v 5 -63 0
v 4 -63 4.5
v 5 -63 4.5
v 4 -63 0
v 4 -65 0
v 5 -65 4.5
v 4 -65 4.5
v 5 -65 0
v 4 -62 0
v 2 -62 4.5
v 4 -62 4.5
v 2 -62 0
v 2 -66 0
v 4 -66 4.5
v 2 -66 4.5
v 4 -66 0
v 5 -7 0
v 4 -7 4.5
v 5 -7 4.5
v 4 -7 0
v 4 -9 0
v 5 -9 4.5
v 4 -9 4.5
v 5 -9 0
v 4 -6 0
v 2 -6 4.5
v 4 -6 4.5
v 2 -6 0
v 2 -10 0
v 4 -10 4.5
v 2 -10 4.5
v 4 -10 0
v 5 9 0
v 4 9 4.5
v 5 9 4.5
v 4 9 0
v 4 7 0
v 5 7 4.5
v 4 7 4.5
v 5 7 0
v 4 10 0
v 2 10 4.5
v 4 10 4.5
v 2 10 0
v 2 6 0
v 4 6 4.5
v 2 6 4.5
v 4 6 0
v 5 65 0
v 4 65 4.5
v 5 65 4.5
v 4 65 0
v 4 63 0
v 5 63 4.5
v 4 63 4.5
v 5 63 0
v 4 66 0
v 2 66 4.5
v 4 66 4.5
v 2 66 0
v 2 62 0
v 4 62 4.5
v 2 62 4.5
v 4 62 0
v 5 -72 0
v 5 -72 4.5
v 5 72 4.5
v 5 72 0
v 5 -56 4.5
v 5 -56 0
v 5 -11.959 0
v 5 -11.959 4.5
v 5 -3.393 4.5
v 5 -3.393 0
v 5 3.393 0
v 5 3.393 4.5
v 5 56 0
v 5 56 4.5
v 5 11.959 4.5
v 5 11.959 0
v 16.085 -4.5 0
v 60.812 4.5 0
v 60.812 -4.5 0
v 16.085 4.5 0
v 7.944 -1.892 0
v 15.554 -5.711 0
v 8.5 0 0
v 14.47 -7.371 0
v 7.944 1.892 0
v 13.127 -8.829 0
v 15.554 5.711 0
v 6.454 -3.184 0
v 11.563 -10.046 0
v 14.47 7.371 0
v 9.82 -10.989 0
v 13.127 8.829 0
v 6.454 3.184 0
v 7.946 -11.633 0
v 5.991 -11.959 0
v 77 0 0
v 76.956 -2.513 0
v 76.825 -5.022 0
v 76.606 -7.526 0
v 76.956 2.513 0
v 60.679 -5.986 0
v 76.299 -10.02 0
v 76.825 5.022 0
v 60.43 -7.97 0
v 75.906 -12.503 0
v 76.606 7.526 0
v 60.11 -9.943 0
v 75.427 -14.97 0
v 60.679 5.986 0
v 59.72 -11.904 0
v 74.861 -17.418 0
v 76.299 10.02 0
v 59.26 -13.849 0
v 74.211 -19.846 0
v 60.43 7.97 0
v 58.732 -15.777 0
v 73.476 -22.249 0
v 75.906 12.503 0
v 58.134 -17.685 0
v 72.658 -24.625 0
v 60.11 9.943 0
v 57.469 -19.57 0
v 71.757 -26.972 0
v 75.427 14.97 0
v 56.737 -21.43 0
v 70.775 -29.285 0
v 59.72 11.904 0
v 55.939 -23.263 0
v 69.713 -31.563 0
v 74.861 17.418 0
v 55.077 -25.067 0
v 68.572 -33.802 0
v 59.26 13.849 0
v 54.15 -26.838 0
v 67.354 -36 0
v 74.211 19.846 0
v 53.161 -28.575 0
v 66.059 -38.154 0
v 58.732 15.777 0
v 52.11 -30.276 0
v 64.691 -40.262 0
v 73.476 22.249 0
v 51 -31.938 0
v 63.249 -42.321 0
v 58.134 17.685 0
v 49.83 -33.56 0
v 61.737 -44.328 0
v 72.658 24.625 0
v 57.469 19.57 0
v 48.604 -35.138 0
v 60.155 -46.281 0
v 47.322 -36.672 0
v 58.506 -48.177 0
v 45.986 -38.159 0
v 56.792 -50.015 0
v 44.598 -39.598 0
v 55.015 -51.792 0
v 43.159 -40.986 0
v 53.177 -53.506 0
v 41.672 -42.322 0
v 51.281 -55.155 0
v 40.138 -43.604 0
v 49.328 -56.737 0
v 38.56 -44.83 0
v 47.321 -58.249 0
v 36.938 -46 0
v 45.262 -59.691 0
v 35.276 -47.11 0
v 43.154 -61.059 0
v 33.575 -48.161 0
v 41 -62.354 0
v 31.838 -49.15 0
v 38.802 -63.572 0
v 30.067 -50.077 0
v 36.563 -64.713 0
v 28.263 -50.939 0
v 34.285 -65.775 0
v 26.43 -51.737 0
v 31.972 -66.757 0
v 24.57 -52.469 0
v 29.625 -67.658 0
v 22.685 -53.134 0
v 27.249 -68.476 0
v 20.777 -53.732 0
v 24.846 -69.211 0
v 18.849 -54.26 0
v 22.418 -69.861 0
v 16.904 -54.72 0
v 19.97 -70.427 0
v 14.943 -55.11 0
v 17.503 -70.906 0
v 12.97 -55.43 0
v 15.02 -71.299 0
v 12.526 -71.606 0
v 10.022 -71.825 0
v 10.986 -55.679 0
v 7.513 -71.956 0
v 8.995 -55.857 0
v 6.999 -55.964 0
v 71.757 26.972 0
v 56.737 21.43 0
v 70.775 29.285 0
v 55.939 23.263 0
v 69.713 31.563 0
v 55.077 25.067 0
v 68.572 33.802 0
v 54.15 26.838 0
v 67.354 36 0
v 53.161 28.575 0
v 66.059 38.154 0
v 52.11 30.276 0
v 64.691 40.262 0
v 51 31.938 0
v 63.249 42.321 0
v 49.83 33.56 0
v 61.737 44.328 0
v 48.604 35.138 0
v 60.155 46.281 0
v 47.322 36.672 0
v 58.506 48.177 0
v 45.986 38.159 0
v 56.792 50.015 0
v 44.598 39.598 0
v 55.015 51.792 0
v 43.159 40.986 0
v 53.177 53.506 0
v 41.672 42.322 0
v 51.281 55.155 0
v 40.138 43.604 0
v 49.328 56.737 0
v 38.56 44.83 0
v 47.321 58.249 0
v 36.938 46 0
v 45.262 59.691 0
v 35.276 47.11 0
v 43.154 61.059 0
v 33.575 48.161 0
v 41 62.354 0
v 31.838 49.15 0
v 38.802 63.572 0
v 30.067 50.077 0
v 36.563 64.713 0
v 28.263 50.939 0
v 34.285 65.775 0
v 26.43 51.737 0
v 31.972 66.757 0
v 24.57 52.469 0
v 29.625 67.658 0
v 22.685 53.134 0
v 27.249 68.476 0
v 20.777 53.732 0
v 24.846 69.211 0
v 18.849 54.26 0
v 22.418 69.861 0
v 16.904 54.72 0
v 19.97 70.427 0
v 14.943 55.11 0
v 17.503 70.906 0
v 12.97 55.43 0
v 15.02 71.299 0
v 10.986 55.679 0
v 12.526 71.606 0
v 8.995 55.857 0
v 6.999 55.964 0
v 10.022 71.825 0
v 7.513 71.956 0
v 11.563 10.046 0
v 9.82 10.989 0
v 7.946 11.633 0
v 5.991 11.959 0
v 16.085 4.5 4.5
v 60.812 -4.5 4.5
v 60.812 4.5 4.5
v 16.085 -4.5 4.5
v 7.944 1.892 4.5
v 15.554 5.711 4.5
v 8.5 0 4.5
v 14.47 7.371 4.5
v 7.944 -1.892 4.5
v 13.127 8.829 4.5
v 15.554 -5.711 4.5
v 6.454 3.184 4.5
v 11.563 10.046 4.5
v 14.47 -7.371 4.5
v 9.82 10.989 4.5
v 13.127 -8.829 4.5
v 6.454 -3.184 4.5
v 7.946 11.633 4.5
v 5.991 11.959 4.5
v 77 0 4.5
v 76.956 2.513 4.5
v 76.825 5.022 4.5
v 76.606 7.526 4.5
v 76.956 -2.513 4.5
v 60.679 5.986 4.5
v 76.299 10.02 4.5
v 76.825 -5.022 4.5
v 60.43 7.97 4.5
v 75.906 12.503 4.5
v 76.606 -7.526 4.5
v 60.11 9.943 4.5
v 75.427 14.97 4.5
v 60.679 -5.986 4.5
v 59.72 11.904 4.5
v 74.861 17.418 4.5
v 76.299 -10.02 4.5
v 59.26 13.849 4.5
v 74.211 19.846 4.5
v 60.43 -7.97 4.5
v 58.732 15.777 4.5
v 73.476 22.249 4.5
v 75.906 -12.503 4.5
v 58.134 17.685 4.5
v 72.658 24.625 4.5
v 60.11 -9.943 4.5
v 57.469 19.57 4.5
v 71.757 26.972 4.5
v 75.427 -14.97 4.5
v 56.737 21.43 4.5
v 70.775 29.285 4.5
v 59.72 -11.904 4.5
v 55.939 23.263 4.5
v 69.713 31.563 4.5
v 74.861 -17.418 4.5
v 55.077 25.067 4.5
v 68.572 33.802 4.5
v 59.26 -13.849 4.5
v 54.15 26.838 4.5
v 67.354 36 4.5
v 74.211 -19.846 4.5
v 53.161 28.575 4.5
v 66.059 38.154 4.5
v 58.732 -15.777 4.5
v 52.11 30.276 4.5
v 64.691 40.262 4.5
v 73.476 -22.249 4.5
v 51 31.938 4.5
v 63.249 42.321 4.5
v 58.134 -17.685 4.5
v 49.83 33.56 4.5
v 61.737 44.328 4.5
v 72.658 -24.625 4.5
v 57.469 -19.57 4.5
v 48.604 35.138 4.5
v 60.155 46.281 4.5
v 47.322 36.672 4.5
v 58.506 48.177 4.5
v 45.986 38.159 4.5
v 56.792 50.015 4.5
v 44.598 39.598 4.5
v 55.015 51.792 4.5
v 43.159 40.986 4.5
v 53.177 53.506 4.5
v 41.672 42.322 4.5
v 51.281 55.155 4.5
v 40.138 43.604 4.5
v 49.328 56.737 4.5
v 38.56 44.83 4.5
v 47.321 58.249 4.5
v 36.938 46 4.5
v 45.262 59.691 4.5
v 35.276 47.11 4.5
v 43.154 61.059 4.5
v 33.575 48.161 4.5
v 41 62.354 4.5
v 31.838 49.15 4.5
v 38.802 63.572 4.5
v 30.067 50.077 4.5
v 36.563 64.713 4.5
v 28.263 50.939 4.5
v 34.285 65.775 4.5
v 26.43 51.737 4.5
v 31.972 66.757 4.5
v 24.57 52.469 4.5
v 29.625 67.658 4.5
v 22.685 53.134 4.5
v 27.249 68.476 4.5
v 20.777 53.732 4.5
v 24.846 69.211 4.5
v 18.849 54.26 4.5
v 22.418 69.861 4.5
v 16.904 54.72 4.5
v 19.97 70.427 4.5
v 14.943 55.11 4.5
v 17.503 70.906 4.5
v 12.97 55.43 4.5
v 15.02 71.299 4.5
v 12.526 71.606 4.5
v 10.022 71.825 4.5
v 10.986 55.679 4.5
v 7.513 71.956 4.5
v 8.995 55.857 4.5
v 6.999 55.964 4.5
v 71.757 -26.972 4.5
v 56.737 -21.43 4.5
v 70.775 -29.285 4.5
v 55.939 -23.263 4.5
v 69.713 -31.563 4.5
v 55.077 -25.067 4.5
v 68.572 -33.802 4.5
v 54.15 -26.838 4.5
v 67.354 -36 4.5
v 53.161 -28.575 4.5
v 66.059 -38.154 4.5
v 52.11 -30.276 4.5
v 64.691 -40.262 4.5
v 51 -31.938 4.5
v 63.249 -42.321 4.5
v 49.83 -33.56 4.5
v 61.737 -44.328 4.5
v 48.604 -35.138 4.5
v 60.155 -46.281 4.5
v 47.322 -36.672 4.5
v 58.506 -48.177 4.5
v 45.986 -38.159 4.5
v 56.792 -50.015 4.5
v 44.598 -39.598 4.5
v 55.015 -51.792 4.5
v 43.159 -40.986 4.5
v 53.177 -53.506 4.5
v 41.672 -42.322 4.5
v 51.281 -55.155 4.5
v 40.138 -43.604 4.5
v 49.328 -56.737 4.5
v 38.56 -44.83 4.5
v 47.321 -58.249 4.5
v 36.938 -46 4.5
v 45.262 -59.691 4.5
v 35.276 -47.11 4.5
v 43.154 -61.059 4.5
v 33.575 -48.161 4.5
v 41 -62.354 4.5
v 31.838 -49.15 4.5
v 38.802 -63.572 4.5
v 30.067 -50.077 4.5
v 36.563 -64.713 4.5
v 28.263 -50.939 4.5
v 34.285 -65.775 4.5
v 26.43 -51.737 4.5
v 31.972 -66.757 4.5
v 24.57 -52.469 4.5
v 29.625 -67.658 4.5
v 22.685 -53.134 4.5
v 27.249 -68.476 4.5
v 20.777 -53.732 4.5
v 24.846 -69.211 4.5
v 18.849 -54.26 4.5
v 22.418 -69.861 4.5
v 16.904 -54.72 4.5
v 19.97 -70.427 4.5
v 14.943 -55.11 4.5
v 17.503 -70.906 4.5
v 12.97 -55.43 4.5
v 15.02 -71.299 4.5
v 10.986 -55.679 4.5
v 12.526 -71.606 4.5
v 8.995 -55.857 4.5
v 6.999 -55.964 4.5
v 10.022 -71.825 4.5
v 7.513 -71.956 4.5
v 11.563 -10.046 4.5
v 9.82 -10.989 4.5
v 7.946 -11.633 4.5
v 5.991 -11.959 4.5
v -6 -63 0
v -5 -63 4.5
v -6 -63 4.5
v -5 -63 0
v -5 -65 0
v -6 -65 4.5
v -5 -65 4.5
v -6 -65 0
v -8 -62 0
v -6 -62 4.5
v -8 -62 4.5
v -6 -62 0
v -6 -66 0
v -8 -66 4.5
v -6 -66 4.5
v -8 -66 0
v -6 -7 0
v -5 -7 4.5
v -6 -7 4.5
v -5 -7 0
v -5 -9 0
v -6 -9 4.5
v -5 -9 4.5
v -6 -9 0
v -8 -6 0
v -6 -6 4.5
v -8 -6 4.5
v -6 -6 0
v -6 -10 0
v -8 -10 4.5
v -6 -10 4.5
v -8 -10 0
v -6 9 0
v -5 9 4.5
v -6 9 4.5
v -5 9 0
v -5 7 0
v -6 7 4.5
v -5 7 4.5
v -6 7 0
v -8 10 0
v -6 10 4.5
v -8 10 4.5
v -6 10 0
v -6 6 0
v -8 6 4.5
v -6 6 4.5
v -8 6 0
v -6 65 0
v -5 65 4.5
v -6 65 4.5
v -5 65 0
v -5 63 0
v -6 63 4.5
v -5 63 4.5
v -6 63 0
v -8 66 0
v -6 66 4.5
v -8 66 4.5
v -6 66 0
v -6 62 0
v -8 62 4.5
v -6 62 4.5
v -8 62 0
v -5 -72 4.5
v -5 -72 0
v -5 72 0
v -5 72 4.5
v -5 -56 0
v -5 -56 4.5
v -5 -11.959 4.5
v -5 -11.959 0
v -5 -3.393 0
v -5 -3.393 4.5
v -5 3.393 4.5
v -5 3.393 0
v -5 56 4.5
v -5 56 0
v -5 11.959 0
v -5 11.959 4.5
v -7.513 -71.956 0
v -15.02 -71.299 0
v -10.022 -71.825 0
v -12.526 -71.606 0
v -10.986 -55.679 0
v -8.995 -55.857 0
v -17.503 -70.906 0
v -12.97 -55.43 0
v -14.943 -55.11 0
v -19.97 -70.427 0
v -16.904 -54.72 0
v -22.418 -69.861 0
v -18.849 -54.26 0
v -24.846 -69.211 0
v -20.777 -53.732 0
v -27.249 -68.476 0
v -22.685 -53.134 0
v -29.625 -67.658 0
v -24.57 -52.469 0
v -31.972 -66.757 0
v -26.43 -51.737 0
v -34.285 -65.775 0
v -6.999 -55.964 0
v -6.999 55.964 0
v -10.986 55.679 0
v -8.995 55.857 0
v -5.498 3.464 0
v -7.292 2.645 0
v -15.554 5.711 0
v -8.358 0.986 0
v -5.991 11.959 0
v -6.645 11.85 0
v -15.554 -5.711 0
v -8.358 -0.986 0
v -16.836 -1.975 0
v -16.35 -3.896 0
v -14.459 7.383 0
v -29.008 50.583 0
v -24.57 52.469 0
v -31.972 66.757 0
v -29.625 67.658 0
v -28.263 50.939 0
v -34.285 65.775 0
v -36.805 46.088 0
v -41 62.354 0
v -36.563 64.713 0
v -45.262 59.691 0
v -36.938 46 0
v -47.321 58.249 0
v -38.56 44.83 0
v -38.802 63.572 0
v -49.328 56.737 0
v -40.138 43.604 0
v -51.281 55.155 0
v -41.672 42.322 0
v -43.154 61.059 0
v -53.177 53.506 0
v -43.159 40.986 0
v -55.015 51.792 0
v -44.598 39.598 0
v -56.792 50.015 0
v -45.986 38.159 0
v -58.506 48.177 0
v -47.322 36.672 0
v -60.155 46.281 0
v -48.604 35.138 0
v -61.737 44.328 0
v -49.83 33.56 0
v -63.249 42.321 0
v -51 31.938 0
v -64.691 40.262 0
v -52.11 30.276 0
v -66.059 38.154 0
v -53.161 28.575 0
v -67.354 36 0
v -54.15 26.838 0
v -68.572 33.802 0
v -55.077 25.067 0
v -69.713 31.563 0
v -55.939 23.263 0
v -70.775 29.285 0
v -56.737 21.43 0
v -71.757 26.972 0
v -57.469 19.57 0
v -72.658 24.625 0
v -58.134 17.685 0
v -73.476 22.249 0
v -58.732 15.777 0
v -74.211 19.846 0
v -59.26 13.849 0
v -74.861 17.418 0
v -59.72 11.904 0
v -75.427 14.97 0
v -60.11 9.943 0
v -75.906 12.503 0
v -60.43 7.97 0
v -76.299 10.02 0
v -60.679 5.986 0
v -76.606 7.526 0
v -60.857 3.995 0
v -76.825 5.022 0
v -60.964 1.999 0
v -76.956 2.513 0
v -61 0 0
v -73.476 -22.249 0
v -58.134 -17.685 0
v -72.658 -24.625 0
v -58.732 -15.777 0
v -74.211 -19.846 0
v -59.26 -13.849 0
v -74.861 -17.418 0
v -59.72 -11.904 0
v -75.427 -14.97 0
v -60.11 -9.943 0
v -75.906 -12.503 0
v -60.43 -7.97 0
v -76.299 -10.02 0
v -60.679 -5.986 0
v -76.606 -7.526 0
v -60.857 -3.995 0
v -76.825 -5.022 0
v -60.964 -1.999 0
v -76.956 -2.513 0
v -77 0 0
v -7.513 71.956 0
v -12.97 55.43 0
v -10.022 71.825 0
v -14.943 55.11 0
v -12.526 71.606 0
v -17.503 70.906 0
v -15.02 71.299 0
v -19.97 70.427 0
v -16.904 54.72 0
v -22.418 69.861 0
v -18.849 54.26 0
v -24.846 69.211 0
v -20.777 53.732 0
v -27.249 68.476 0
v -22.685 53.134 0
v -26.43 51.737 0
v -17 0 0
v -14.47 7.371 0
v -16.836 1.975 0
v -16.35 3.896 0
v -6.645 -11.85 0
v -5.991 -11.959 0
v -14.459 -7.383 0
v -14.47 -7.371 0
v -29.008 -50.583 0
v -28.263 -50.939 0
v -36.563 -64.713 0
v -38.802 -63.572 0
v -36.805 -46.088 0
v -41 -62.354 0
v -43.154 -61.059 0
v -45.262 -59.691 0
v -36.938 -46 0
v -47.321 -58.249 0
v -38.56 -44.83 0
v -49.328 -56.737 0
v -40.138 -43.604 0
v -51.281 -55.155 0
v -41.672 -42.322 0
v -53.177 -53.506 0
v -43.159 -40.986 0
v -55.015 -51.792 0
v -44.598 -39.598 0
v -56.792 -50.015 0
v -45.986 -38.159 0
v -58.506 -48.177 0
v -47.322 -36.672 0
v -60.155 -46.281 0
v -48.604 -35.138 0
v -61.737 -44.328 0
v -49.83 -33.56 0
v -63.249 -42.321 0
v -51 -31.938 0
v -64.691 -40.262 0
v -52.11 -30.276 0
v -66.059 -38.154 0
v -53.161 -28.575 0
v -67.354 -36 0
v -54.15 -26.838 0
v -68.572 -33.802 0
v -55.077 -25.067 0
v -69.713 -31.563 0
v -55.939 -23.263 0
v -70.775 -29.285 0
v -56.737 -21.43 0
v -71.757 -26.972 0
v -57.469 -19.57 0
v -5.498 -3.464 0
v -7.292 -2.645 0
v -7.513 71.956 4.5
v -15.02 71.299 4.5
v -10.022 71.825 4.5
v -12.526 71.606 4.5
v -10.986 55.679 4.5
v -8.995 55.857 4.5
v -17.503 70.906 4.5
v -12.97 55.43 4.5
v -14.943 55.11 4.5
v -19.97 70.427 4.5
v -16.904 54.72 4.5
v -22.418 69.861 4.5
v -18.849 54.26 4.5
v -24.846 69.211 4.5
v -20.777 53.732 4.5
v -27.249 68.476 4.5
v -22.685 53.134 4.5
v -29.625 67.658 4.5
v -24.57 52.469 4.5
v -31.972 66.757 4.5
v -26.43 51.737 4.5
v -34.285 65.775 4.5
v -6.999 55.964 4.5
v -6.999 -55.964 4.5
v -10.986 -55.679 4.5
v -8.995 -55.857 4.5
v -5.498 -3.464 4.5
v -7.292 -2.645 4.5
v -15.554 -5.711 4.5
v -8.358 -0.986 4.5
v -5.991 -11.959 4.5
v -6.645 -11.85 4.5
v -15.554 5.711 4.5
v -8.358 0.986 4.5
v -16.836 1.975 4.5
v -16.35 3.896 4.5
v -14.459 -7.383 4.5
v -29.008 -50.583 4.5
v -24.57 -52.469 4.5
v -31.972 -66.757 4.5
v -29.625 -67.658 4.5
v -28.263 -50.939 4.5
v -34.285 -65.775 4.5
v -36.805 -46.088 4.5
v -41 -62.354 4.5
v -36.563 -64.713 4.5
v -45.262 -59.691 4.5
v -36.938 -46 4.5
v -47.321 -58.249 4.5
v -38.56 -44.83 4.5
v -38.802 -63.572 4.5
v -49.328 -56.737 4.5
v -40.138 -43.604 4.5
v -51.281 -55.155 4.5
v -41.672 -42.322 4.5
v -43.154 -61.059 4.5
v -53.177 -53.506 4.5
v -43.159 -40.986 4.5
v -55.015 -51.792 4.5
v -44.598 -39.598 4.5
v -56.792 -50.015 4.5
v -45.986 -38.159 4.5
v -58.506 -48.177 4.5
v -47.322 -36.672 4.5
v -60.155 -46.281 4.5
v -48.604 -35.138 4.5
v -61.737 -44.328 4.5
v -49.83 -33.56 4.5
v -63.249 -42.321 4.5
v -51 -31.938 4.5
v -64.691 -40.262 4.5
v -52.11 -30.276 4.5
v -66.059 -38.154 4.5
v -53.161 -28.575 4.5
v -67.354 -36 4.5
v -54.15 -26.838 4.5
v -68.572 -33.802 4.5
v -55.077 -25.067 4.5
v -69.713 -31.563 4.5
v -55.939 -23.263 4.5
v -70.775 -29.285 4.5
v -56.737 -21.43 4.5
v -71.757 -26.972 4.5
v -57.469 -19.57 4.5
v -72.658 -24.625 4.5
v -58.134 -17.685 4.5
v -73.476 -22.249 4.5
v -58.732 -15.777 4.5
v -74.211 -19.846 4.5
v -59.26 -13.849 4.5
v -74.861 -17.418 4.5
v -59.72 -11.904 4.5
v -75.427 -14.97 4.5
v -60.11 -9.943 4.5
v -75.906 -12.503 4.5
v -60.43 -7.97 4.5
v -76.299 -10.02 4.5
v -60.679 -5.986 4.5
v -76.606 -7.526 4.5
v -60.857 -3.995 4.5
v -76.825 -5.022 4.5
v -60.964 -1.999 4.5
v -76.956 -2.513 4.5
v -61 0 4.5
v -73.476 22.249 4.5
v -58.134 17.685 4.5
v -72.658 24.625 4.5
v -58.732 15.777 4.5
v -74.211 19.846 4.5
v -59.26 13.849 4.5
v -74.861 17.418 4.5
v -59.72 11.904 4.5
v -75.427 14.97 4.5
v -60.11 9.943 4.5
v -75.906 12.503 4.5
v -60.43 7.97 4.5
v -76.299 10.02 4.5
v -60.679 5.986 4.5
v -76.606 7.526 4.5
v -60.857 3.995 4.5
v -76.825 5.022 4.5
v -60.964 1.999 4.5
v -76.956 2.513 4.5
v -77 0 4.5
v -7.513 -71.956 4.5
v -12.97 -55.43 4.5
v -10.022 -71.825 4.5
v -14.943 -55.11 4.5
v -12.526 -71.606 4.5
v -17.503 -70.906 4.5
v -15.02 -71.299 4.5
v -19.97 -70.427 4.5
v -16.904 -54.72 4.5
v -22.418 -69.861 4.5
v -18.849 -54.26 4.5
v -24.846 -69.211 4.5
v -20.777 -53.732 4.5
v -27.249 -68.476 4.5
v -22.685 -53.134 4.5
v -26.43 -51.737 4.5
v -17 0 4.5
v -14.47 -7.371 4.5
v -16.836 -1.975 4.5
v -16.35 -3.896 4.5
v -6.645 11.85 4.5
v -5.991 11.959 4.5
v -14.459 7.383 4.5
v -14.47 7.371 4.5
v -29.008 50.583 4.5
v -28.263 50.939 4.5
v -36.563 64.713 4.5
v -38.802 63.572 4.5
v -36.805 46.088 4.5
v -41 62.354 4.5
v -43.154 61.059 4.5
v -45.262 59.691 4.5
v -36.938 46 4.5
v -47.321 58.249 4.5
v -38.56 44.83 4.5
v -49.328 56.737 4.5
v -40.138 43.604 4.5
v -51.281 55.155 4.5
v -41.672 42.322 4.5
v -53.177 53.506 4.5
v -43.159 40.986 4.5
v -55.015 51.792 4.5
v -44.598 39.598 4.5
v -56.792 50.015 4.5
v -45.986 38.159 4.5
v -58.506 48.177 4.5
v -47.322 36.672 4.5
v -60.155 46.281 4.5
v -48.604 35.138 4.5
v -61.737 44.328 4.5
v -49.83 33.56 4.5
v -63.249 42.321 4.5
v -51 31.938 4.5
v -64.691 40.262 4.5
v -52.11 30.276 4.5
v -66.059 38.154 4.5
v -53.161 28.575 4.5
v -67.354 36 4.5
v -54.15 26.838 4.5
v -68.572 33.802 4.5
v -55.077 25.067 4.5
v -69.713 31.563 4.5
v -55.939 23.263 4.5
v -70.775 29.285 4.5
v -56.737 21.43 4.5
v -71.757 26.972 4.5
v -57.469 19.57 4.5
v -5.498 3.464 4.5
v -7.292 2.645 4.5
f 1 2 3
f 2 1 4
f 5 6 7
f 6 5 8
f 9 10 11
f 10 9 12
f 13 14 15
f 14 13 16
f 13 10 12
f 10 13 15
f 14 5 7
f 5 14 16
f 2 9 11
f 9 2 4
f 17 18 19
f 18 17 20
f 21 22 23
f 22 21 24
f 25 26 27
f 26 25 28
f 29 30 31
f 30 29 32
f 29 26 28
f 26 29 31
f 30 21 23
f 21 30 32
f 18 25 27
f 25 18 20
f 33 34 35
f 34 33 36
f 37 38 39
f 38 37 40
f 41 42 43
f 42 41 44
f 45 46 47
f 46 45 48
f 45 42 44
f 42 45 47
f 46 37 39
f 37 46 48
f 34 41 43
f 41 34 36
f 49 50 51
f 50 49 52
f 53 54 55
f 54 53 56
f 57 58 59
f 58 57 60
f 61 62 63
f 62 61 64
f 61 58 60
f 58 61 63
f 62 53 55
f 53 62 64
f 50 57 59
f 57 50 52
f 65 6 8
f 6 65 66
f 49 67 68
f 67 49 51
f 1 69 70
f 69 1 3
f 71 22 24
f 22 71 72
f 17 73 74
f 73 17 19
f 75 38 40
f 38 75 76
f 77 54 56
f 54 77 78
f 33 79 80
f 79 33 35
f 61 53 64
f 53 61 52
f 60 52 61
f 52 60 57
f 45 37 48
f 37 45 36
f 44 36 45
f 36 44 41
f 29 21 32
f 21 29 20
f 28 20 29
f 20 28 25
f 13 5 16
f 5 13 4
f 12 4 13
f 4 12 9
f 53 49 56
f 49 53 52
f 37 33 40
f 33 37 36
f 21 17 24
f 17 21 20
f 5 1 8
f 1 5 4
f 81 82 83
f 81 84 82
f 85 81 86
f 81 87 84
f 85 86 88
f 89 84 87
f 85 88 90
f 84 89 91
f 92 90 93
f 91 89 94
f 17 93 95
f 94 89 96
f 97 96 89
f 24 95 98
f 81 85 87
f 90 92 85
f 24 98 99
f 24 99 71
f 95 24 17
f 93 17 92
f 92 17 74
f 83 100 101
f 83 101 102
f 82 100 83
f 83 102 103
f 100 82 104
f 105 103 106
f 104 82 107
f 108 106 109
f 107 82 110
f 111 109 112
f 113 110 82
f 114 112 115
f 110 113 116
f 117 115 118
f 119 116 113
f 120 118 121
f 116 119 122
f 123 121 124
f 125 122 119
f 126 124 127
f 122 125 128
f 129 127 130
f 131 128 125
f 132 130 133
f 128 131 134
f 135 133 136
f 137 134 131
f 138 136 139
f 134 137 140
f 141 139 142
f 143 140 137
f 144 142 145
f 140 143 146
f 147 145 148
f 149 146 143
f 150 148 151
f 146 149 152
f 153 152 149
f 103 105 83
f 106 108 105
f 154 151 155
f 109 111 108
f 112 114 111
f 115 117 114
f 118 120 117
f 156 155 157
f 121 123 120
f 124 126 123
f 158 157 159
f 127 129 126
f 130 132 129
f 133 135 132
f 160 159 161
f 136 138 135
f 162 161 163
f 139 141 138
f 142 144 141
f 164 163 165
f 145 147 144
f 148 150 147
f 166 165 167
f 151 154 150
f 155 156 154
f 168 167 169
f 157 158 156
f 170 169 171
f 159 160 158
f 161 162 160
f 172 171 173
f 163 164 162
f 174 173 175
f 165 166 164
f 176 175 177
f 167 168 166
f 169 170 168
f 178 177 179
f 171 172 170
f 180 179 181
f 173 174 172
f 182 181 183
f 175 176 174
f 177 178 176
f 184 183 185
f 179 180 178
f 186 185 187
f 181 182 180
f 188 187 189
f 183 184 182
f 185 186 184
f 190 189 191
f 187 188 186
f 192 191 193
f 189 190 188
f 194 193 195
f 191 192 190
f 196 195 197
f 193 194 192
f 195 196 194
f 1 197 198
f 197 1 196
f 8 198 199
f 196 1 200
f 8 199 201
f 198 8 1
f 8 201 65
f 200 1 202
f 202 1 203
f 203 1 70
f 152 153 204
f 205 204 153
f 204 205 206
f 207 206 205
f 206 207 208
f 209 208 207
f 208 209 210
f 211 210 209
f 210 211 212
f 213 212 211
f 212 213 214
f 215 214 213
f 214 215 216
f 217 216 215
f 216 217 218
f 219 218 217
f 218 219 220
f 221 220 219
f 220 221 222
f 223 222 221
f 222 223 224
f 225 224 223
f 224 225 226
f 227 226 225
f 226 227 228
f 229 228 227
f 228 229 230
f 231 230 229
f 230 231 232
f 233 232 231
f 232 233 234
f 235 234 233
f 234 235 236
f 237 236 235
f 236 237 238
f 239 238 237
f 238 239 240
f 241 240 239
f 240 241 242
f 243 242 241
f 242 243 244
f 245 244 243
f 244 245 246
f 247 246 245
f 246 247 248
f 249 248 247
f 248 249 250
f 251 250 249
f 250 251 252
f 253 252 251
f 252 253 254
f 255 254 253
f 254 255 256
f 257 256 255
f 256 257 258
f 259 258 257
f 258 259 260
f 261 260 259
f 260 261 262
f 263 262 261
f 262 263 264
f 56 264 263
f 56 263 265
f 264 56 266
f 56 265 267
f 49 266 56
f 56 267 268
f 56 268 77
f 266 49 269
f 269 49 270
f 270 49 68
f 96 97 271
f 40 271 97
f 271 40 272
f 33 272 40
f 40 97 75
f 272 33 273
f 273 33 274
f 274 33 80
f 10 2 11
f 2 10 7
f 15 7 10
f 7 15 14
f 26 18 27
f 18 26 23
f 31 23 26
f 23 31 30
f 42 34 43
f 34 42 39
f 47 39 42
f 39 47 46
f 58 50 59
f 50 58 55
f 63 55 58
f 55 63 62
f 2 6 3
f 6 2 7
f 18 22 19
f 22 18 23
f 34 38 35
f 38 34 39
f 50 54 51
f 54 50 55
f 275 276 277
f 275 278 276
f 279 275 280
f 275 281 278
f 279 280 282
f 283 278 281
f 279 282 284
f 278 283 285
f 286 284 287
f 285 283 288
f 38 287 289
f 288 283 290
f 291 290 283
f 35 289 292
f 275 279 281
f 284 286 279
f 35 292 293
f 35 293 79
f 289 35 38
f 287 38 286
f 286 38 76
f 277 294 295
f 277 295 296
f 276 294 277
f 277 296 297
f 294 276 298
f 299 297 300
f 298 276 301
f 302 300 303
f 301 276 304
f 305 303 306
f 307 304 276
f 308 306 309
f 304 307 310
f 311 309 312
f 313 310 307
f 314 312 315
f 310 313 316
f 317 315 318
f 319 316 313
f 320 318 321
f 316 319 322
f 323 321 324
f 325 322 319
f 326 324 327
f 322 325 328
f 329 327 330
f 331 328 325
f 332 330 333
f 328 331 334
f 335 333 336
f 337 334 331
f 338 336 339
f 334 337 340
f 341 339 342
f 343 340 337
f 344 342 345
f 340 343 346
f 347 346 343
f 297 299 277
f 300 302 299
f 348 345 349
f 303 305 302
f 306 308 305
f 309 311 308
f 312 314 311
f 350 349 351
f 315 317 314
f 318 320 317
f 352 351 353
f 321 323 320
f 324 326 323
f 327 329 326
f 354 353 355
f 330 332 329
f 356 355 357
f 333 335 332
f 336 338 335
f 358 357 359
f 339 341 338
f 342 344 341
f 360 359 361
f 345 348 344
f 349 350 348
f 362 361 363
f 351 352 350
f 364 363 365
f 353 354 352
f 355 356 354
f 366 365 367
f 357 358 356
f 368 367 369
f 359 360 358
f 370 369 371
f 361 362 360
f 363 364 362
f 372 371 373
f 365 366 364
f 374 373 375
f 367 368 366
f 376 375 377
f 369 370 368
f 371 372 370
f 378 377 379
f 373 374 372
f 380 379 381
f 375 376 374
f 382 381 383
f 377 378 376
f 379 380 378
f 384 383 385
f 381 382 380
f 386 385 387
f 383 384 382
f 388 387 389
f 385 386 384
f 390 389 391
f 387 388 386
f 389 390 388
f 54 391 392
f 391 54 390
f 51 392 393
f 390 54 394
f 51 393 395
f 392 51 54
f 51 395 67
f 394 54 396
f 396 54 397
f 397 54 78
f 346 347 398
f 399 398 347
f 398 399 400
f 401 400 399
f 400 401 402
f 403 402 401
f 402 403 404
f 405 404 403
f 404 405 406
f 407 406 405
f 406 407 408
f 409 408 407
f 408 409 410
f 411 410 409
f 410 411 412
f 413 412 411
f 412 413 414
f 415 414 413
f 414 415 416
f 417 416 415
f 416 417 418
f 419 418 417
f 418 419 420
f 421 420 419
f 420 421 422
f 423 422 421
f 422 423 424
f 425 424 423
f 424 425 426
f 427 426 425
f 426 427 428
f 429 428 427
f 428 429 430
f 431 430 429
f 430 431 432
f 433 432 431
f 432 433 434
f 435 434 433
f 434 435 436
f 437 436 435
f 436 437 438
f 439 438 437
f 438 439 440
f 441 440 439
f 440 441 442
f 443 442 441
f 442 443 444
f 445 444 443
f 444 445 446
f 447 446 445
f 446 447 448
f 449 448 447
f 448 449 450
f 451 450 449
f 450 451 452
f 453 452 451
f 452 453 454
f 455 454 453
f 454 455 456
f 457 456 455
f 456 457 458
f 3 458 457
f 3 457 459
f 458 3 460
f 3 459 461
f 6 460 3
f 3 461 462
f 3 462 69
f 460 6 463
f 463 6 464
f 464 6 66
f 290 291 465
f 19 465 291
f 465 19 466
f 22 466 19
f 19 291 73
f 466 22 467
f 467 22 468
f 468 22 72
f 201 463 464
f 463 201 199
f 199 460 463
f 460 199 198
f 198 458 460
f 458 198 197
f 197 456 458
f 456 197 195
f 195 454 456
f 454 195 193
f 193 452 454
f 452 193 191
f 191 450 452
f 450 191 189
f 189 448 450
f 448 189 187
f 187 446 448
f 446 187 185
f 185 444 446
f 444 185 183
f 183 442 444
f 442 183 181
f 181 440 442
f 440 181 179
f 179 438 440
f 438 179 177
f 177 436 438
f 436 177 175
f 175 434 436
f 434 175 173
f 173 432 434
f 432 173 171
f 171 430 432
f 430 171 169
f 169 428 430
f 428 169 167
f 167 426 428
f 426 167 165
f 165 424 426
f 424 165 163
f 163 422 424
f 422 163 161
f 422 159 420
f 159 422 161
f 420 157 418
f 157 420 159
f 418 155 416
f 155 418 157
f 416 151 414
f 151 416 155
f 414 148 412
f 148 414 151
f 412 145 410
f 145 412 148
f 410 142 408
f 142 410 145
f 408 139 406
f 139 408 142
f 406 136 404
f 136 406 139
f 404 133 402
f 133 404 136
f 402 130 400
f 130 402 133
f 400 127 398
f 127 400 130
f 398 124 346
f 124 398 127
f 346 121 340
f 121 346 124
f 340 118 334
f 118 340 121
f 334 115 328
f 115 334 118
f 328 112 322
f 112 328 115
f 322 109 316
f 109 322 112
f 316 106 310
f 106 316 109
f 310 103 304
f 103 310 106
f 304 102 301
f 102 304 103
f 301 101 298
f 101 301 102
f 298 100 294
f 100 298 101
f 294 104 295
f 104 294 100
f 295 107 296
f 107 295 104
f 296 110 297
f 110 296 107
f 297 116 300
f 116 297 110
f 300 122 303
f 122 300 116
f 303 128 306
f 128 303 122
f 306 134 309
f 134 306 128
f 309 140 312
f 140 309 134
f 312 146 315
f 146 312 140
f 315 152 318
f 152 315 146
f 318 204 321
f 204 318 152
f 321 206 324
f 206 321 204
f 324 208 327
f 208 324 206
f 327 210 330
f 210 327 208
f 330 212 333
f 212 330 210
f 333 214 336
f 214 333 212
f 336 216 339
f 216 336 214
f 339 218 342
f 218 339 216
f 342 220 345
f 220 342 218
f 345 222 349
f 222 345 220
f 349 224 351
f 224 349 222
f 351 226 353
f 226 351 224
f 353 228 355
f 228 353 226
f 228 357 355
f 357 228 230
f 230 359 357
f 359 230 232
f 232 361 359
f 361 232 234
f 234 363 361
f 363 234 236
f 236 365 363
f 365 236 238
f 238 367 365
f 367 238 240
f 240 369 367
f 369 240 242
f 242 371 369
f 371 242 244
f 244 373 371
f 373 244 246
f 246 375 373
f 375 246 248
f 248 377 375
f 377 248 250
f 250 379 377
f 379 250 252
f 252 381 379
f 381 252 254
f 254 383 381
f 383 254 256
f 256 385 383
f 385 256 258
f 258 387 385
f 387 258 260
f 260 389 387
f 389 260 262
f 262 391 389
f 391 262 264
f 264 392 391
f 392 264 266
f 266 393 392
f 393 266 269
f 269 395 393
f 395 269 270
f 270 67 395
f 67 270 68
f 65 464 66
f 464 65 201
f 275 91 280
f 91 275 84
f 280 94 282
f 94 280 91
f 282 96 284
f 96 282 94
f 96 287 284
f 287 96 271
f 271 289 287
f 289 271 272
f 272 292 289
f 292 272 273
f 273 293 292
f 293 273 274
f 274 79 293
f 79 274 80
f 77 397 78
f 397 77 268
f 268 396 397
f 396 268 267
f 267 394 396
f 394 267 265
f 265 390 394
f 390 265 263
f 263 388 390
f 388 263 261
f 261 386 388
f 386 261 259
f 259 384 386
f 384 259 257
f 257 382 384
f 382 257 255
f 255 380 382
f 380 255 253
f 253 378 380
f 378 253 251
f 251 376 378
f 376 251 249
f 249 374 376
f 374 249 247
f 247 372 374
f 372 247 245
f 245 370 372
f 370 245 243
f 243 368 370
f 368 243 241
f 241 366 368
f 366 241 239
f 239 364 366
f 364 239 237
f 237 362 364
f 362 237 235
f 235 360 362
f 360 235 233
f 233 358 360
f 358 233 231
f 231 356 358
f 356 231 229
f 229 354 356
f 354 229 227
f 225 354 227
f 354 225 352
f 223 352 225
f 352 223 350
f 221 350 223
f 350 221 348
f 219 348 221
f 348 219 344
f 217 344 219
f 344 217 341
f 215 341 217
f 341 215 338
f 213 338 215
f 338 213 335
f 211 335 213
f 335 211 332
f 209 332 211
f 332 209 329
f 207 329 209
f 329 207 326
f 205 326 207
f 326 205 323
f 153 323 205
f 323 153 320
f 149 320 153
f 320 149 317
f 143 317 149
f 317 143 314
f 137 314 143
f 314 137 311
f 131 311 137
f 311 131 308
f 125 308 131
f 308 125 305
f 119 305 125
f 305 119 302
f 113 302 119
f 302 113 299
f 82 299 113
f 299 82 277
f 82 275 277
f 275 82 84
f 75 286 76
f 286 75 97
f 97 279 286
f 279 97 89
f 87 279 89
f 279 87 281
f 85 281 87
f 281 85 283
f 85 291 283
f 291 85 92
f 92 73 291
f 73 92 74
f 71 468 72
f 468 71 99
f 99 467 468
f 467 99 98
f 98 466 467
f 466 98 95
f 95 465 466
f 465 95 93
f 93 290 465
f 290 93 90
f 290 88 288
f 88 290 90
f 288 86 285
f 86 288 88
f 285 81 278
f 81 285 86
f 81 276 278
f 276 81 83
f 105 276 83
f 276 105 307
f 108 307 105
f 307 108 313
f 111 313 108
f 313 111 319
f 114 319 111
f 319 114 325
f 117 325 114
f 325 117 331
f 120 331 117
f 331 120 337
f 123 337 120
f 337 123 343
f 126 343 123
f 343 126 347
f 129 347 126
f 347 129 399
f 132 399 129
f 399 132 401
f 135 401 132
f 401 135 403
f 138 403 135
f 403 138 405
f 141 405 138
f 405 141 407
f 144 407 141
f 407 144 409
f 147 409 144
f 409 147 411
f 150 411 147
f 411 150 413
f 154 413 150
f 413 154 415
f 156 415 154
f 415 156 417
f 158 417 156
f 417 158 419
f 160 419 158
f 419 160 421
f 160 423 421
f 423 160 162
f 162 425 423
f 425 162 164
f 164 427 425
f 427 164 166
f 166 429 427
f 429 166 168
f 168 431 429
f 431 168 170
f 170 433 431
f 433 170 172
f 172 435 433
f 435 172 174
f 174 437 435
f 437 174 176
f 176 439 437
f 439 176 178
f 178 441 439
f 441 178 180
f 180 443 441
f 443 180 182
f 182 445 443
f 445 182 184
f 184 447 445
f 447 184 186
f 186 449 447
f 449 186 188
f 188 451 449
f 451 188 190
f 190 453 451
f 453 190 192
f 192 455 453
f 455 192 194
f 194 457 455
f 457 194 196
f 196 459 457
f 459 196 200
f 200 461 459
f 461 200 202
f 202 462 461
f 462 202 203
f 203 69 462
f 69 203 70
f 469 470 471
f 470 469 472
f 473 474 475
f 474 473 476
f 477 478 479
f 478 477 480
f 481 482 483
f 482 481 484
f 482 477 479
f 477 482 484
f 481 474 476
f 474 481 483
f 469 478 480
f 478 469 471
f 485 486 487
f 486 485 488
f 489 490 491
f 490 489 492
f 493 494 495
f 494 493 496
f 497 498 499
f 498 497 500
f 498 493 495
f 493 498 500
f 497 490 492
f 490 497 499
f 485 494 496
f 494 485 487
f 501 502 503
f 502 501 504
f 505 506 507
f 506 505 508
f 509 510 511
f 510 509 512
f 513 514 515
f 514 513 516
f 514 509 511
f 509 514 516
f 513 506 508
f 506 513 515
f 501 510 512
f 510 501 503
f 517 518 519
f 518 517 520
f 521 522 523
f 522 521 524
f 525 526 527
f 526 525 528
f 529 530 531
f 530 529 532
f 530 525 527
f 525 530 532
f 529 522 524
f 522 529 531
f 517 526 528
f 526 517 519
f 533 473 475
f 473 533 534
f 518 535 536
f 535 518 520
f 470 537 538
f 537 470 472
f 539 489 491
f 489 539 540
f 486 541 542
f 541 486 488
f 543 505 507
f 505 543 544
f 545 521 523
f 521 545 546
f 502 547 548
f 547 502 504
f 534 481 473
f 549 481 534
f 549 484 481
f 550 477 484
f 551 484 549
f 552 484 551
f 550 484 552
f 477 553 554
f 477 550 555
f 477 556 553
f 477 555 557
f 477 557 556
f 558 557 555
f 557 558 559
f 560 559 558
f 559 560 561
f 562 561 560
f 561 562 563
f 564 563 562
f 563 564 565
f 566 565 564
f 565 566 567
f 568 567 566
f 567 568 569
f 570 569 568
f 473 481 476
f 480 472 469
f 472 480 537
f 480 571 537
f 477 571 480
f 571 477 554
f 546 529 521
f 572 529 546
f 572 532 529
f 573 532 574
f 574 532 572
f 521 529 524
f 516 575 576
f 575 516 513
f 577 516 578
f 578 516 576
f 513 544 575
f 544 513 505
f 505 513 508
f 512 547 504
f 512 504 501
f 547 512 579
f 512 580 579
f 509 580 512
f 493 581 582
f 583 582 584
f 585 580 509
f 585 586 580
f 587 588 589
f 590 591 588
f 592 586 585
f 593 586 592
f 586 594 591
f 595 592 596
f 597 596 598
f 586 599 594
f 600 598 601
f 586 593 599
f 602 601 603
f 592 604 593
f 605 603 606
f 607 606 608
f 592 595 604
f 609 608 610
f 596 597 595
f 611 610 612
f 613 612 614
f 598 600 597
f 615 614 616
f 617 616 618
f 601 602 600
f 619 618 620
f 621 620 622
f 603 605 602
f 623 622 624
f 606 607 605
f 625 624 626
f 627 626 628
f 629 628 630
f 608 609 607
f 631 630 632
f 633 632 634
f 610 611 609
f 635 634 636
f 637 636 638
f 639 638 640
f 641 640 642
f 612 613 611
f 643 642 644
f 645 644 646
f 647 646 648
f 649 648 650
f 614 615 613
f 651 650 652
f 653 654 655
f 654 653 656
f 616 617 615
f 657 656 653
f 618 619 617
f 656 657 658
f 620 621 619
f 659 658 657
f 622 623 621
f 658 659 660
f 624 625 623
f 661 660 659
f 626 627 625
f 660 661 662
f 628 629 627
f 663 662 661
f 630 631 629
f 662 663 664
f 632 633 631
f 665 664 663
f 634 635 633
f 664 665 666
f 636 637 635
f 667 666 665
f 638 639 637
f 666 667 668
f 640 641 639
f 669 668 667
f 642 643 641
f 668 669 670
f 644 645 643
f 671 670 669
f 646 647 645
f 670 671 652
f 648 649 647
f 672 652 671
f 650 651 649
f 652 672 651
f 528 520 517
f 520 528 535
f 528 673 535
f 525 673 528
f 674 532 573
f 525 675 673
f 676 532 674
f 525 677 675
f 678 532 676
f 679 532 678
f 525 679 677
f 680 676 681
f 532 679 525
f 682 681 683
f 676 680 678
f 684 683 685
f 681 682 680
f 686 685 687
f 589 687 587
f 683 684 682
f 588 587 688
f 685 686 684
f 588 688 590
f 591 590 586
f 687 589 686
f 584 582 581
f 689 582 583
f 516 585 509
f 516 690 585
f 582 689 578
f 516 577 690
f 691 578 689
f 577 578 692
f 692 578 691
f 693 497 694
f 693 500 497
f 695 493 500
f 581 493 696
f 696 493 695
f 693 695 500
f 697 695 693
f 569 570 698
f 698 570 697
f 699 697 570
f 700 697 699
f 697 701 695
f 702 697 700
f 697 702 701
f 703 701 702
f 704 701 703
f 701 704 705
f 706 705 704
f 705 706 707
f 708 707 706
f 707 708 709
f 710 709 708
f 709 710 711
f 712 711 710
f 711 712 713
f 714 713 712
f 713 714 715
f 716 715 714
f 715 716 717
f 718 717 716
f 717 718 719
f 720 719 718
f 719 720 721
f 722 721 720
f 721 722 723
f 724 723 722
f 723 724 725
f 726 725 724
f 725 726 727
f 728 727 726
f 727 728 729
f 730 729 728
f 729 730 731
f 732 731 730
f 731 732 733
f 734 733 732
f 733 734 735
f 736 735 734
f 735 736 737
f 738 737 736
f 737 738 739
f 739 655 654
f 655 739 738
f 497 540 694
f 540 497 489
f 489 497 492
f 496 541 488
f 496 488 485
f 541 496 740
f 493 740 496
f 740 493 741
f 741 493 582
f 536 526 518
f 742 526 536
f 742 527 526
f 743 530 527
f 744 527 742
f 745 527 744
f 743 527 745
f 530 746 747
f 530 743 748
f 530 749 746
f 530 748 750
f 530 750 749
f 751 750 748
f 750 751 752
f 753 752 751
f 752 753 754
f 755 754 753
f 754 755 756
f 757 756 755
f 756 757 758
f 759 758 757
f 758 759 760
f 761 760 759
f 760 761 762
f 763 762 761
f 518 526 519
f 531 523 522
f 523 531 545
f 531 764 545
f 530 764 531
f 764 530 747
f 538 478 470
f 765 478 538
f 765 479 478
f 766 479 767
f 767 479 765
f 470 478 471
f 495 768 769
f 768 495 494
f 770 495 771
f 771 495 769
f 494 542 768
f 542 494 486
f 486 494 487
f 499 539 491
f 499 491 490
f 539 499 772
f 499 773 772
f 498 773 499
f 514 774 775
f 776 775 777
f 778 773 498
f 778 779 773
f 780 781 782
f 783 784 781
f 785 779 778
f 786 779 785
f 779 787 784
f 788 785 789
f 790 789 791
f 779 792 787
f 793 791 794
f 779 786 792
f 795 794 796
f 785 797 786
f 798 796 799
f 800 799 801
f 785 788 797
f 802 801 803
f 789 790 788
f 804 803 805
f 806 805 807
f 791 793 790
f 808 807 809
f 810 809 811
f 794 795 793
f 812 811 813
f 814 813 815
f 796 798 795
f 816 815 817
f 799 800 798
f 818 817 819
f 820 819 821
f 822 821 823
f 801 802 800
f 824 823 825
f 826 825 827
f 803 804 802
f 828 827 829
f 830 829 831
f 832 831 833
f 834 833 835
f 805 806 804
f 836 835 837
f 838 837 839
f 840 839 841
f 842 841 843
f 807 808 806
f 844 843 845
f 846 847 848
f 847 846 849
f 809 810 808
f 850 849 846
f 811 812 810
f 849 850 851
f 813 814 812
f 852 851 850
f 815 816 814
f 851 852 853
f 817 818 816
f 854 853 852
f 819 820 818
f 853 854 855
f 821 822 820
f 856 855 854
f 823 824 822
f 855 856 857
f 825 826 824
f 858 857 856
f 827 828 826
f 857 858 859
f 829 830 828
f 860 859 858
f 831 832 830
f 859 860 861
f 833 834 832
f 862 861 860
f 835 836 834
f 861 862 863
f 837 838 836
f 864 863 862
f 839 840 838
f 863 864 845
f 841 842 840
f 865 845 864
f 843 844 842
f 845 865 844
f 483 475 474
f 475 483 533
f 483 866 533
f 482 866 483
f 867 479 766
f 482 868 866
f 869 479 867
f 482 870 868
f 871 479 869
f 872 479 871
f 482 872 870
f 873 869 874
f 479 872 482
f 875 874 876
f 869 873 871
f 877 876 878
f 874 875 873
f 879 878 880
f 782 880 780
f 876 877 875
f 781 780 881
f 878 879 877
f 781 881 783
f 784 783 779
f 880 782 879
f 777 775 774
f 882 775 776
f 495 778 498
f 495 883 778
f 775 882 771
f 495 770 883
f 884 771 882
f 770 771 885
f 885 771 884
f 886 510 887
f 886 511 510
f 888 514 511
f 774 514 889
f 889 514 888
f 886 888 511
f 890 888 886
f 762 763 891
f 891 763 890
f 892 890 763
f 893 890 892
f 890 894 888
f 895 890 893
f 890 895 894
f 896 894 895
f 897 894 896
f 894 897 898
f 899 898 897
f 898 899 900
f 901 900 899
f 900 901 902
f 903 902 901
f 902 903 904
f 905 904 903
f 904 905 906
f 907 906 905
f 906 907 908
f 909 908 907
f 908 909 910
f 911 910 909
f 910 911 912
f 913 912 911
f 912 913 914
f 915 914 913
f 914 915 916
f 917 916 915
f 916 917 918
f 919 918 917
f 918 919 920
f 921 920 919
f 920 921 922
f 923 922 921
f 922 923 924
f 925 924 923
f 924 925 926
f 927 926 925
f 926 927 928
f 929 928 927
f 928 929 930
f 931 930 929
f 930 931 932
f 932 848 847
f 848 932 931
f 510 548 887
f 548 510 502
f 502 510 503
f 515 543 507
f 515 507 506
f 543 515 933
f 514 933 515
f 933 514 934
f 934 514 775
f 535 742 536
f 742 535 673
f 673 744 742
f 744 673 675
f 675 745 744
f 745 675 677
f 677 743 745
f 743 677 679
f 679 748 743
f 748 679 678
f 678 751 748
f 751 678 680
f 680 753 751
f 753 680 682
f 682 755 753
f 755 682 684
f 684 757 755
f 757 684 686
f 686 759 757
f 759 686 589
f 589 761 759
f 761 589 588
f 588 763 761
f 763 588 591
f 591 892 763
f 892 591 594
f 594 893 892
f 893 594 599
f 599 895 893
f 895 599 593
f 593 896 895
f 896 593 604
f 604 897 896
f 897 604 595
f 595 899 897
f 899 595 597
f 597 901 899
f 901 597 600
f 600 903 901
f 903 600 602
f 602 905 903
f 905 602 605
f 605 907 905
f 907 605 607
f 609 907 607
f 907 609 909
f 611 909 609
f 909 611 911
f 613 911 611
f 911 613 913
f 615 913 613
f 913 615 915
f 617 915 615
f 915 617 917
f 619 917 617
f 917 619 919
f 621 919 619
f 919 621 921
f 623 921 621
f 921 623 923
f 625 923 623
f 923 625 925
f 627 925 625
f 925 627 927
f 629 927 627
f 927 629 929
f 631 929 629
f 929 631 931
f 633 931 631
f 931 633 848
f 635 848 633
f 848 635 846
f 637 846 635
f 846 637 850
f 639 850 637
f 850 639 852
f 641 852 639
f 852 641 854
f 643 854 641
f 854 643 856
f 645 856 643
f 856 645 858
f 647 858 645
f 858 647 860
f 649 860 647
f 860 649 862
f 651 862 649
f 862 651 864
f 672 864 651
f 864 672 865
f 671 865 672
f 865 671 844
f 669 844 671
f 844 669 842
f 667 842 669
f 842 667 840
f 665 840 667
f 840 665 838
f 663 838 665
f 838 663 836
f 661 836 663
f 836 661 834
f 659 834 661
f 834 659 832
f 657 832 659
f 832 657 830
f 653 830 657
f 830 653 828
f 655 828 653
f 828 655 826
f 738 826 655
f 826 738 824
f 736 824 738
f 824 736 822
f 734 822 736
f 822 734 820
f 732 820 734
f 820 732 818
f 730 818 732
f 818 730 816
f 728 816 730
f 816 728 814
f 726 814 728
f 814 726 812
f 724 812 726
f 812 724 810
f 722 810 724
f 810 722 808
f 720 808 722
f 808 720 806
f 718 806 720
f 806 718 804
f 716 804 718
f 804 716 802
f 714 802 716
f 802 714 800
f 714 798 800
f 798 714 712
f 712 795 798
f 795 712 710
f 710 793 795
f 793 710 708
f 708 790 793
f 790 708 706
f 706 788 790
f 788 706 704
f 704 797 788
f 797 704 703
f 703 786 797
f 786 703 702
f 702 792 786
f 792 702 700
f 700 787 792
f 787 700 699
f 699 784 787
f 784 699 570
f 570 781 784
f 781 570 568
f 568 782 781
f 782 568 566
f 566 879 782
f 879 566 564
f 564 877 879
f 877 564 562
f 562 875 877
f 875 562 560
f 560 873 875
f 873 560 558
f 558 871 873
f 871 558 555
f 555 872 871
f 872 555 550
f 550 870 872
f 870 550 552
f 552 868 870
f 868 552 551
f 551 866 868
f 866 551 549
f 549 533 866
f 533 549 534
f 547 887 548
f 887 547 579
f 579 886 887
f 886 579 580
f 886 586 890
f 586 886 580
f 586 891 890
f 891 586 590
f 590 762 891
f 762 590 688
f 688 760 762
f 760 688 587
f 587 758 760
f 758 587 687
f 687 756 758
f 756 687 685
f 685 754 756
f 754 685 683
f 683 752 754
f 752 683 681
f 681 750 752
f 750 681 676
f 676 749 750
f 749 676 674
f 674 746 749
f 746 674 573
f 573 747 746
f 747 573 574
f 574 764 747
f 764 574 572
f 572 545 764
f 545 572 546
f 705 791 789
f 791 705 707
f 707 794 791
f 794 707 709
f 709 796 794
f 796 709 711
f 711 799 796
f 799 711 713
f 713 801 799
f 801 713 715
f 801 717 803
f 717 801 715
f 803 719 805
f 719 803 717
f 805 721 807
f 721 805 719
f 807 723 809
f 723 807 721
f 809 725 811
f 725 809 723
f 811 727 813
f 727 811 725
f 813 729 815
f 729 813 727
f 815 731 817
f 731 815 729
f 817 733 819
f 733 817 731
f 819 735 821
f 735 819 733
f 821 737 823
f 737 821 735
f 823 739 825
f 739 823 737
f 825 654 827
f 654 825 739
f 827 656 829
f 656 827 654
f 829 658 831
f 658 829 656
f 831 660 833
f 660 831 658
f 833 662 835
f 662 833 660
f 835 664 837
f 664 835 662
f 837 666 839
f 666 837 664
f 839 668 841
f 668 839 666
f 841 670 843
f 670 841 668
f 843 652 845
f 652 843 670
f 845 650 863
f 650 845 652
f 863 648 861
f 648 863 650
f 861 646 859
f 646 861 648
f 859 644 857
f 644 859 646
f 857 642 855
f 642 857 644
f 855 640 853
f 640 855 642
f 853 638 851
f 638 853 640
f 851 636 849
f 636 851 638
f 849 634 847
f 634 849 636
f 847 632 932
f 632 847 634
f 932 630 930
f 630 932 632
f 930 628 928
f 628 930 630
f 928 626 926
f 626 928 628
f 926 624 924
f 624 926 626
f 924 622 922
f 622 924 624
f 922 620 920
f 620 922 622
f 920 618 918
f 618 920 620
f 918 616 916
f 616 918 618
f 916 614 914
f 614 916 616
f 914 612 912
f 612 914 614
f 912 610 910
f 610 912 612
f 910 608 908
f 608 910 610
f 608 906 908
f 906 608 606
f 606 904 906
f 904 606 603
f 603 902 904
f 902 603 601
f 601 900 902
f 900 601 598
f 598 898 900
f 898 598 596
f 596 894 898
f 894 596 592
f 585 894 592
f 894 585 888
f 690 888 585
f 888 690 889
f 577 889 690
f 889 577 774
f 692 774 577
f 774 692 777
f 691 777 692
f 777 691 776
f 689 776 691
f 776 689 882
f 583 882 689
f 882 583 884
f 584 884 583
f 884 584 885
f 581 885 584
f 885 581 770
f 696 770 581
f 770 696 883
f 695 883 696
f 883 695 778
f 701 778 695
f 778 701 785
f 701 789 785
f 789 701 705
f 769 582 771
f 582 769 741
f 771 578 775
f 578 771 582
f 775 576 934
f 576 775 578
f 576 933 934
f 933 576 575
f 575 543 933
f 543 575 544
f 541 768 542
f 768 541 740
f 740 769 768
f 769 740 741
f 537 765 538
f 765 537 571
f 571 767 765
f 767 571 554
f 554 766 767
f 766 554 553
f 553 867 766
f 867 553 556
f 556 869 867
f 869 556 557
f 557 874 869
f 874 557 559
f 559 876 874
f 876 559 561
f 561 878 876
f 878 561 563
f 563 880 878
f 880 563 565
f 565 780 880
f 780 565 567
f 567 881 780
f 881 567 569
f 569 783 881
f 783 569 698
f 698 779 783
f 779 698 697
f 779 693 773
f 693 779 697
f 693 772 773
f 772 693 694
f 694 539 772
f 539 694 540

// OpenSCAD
// file: demoobject.scad
//this file is used by puzzlecutdemo1.scad (does not render directly)


outsideCircle = 72;
platformWidth = 16;
platformDepth = 4.5;
supportBeamWidth = 9;
supportCenterCircleRadius = 12;
centerHoleRadius = 3.5;

$fs = 2;
$fa = 2;

module drawDemoObject()
{

	linear_extrude(height = platformDepth) supportPlatform();

}

module beams()
{
		circle(supportCenterCircleRadius);
		translate ([0,-supportBeamWidth / 2, 0]) square([outsideCircle - platformWidth, supportBeamWidth]);
		rotate ([0,0,120]) translate ([0,-supportBeamWidth / 2, 0]) square([outsideCircle - platformWidth, supportBeamWidth]);
		rotate ([0,0,240]) translate ([0,-supportBeamWidth / 2, 0]) square([outsideCircle - platformWidth, supportBeamWidth]);
}

module supportPlatform()
{
	difference()
	{
		beams();
		circle(centerHoleRadius);
	}
	
	difference()
	{
		circle(outsideCircle);
		circle(outsideCircle - platformWidth);
	}
}
// file: puzzlecutlib.scad
//OpenSCAD PuzzleCut Library - by Rich Olson
//http://www.nothinglabs.com
//Tested on build 2015.03-2
//License: http://creativecommons.org/licenses/by/3.0/

//This is just the library - see other files for demo / usage

//!!!!!
//IMPORTANT NOTE: Puzzlecut only works correctly when RENDERING (F6)!  Preview (F5) will not produce usable results!
//!!!!!


module xMaleCut(offset = 0, cut = xCut1)
{
	difference()
	{
		children(0);	
		translate([0,offset,0]) makePuzzleStamp(cutLocations = cut);
	}
}


module xFemaleCut(offset = 0, cut = xCut1)
{
	intersection()
	{
		children(0);
		translate([0,offset,0]) makePuzzleStamp(cutLocations = cut,
			 kerf = kerf);	//only set kerf on female side
	}
}


module yMaleCut(offset = 0, cut = yCut1)
{
	difference()
	{
		children(0);	
		rotate ([0,0,90]) translate([0,offset,0]) makePuzzleStamp(cutLocations = cut);
	}
}


module yFemaleCut(offset = 0, cut = yCut1)
{
	intersection()
	{
		children(0);
		rotate ([0,0,90]) translate([0,offset,0]) makePuzzleStamp(cutLocations = cut,
			 kerf = kerf);	//only set kerf on female side
	}
}



module makePuzzleStamp(kerf = 0)
{
	difference()
	{
		//make the cube
		translate ([0,stampSize[0] / 2 - kerf,0])
			cube (stampSize, center = true);
		
		//make the cuts
		for ( i = cutLocations )
		{
			translate([i,0,0])
				cube ([(cutSize / 2) - kerf * 2, cutSize - kerf * 2,stampSize[2]], center = true);
			translate([i,cutSize / 2,0])
				cube ([cutSize - kerf *  2,(cutSize / 2) - kerf * 2, stampSize[2]], center = true);
		}		
	}
}
// main file
//OpenSCAD PuzzleCut Library Demo - by Rich Olson
//http://www.nothinglabs.com
//Tested on build 2015.03-2
//License: http://creativecommons.org/licenses/by/3.0/

//!!!!!
//IMPORTANT NOTE: Puzzlecut only works correctly when RENDERING (F6)!  Preview (F5) will not produce usable results!
//!!!!!

include <puzzlecutlib.scad>
include <demoobject.scad>

stampSize = [500,500,100];		//size of cutting stamp (should cover 1/2 of object)

cutSize = 4;	//size of the puzzle cuts

xCut1 = [-64, -8, 8, 27, 45, 64];	//locations of puzzle cuts relative to X axis center
yCut1 = [-64, -8, 8, 64];				//for Y axis

kerf = 0;		//supports +/- numbers (greater value = tighter fit)
					//using a small negative number may be useful to assure easy fit for 3d printing
					//using positive values useful for lasercutting
					//negative values can also help visualize cuts without seperating pieces

cutInTwo(); //cuts in two along y axis
//cutInFour();  //cuts in four along x / y axis

//comment out lines as needed to render individual pieces

module cutInTwo()
{
	translate([5,0,0])
		yMaleCut() drawDemoObject();

	translate([-5,0,0])
		yFemaleCut() drawDemoObject();
}

module cutInFour()
{
	translate([5,-5,0])
		xMaleCut() yMaleCut() drawDemoObject();

	translate([-5,-5,0])
		xMaleCut() yFemaleCut() drawDemoObject();

	translate([5,5,0])
		xFemaleCut() yMaleCut() drawDemoObject();

	translate([-5,5,0])
		xFemaleCut() yFemaleCut() drawDemoObject();
}
